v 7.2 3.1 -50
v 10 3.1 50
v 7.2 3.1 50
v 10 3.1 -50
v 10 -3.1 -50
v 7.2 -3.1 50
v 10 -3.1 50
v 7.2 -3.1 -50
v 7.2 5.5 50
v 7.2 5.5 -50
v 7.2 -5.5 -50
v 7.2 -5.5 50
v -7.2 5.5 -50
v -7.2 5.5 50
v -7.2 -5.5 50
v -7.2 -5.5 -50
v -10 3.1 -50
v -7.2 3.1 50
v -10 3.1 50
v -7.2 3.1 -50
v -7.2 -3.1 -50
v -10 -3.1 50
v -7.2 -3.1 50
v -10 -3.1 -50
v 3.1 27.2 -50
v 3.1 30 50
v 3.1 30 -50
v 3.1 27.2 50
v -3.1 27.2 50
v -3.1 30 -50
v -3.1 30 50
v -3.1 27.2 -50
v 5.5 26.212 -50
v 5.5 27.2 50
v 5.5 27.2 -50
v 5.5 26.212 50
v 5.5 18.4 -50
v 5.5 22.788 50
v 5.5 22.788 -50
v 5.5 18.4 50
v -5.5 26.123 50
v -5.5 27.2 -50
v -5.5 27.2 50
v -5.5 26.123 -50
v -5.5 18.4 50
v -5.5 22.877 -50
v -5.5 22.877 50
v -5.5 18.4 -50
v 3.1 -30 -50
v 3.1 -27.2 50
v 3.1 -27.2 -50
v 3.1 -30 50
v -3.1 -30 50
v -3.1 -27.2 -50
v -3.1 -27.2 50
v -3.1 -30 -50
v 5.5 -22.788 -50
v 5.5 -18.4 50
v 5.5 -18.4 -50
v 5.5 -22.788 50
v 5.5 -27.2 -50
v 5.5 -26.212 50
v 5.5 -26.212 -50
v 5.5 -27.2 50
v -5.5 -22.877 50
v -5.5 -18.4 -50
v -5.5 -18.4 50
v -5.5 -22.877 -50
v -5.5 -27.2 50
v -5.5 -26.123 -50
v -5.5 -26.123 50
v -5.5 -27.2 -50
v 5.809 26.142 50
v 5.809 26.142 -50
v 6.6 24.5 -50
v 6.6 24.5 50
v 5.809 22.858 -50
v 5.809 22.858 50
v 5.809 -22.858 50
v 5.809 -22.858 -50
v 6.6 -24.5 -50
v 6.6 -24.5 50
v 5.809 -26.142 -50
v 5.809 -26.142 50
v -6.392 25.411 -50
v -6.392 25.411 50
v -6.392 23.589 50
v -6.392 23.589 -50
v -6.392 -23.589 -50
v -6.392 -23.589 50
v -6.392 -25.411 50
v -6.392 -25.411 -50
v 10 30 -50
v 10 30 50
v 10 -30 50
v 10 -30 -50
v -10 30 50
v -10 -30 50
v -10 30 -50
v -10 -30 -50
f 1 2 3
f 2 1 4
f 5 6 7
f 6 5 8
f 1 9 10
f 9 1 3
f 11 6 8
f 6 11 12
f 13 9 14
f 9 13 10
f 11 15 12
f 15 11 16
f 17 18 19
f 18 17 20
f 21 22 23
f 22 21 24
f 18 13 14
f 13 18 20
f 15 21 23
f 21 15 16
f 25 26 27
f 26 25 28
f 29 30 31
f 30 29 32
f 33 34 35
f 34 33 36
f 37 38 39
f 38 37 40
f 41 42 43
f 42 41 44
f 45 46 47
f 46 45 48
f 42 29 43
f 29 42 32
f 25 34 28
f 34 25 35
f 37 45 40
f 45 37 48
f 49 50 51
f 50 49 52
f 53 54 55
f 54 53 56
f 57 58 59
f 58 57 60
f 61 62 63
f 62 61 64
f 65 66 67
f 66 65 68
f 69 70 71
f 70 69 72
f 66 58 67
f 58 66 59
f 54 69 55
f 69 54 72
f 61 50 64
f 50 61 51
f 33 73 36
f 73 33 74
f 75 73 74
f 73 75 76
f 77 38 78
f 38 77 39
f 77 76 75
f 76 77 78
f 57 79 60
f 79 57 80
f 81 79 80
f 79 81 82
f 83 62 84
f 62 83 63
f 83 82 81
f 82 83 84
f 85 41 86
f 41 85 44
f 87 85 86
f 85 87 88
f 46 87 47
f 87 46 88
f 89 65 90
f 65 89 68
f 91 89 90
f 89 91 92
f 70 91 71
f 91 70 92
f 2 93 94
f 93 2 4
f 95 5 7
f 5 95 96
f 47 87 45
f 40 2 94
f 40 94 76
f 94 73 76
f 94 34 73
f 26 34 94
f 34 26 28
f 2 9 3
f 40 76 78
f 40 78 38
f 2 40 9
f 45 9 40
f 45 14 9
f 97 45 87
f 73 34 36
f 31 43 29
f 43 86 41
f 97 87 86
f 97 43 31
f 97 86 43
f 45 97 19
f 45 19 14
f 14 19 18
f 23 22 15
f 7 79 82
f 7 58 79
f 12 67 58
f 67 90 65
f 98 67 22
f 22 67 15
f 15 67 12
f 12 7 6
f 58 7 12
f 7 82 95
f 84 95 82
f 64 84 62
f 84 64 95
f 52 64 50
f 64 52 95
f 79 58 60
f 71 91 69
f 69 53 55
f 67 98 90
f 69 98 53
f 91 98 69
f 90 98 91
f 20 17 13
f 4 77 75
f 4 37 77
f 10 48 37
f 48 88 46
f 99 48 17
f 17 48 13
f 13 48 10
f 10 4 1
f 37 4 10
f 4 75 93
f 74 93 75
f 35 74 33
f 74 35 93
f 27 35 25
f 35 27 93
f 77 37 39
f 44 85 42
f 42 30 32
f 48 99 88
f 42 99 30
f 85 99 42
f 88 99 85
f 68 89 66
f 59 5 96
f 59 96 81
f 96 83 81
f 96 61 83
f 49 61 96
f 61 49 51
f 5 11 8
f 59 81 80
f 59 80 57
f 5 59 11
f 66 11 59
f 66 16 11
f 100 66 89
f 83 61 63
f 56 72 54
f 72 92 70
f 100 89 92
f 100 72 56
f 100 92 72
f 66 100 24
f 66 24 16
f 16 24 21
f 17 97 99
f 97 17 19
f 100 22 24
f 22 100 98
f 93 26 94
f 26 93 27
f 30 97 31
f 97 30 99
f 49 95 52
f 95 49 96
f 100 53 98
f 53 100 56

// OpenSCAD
// Parameters
cross_section_width_mm = 20; //[10:40:1]
cross_section_height_mm = 60; //[30:120:1]
length_mm = 100; //[50:200:1]
center_length = 1; //[0:1:1]
include_corner_holes = 1; //[0:1:1]
eps_mm = 0.8; //[0.2:2:0.1]
wall_thickness_mm = 2.2; //[1.2:4.4:0.1]
t_slot_opening_mm = 6.2; //[4:10:0.1]
t_slot_neck_depth_mm = 3.2; //[2:6:0.1]
t_slot_cavity_width_mm = 11; //[8:16:0.1]
t_slot_cavity_depth_mm = 8; //[5:14:0.1]
center_bore_diameter_mm = 5.2; //[3:10:0.1]
web_thickness_mm = 2.0; //[1.0:4.0:0.1]
corner_hole_diameter_mm = 4.2; //[2.5:8:0.1]
corner_hole_inset_mm = 5.5; //[3:12:0.1]

// Extrusion - complete detailed geometry
module extrusion() {
  color("Silver") {
    difference() {
      // Main body
      translate([0, 0, center_length*(0) + (1-center_length)*(length_mm/2)])
        cube([cross_section_width_mm, cross_section_height_mm, length_mm], center=true);
      
      // T-slot channels
      union() {
        translate([cross_section_width_mm/2 - (t_slot_neck_depth_mm + eps_mm)/2 + eps_mm/2, 0, center_length*(0) + (1-center_length)*(length_mm/2)])
          cube([t_slot_neck_depth_mm + eps_mm, t_slot_opening_mm, length_mm + 2*eps_mm], center=true);
        translate([cross_section_width_mm/2 - t_slot_neck_depth_mm - (t_slot_cavity_depth_mm + eps_mm)/2 + eps_mm/2, 0, center_length*(0) + (1-center_length)*(length_mm/2)])
          cube([t_slot_cavity_depth_mm + eps_mm, t_slot_cavity_width_mm, length_mm + 2*eps_mm], center=true);
        translate([-cross_section_width_mm/2 + (t_slot_neck_depth_mm + eps_mm)/2 - eps_mm/2, 0, center_length*(0) + (1-center_length)*(length_mm/2)])
          cube([t_slot_neck_depth_mm + eps_mm, t_slot_opening_mm, length_mm + 2*eps_mm], center=true);
        translate([-cross_section_width_mm/2 + t_slot_neck_depth_mm + (t_slot_cavity_depth_mm + eps_mm)/2 - eps_mm/2, 0, center_length*(0) + (1-center_length)*(length_mm/2)])
          cube([t_slot_cavity_depth_mm + eps_mm, t_slot_cavity_width_mm, length_mm + 2*eps_mm], center=true);
        translate([0, cross_section_height_mm/2 - (t_slot_neck_depth_mm + eps_mm)/2 + eps_mm/2, center_length*(0) + (1-center_length)*(length_mm/2)])
          cube([t_slot_opening_mm, t_slot_neck_depth_mm + eps_mm, length_mm + 2*eps_mm], center=true);
        translate([0, cross_section_height_mm/2 - t_slot_neck_depth_mm - (t_slot_cavity_depth_mm + eps_mm)/2 + eps_mm/2, center_length*(0) + (1-center_length)*(length_mm/2)])
          cube([t_slot_cavity_width_mm, t_slot_cavity_depth_mm + eps_mm, length_mm + 2*eps_mm], center=true);
        translate([0, -cross_section_height_mm/2 + (t_slot_neck_depth_mm + eps_mm)/2 - eps_mm/2, center_length*(0) + (1-center_length)*(length_mm/2)])
          cube([t_slot_opening_mm, t_slot_neck_depth_mm + eps_mm, length_mm + 2*eps_mm], center=true);
        translate([0, -cross_section_height_mm/2 + t_slot_neck_depth_mm + (t_slot_cavity_depth_mm + eps_mm)/2 - eps_mm/2, center_length*(0) + (1-center_length)*(length_mm/2)])
          cube([t_slot_cavity_width_mm, t_slot_cavity_depth_mm + eps_mm, length_mm + 2*eps_mm], center=true);
      }
      
      // Center bore
      translate([0, 0, center_length*(0) + (1-center_length)*(length_mm/2)])
        cylinder(r=center_bore_diameter_mm/2, h=length_mm + 2*eps_mm, center=true);
      
      // Corner holes
      if (include_corner_holes) {
        union() {
          translate([cross_section_width_mm/2 - corner_hole_inset_mm, cross_section_height_mm/2 - corner_hole_inset_mm, center_length*(0) + (1-center_length)*(length_mm/2)])
            cylinder(r=corner_hole_diameter_mm/2, h=length_mm + 2*eps_mm, center=true);
          translate([cross_section_width_mm/2 - corner_hole_inset_mm, -cross_section_height_mm/2 + corner_hole_inset_mm, center_length*(0) + (1-center_length)*(length_mm/2)])
            cylinder(r=corner_hole_diameter_mm/2, h=length_mm + 2*eps_mm, center=true);
          translate([-cross_section_width_mm/2 + corner_hole_inset_mm, cross_section_height_mm/2 - corner_hole_inset_mm, center_length*(0) + (1-center_length)*(length_mm/2)])
            cylinder(r=corner_hole_diameter_mm/2, h=length_mm + 2*eps_mm, center=true);
          translate([-cross_section_width_mm/2 + corner_hole_inset_mm, -cross_section_height_mm/2 + corner_hole_inset_mm, center_length*(0) + (1-center_length)*(length_mm/2)])
            cylinder(r=corner_hole_diameter_mm/2, h=length_mm + 2*eps_mm, center=true);
        }
      }
    }
  }
}

// Extrusion Cross Section - detailed geometry
module extrusion_cross_section() {
  color("DimGray") {
    difference() {
      // Main body
      translate([0, 0, center_length*(0) + (1-center_length)*(length_mm/2)])
        cube([cross_section_width_mm, cross_section_height_mm, length_mm], center=true);
      
      // T-slot channels
      union() {
        translate([cross_section_width_mm/2 - (t_slot_neck_depth_mm + eps_mm)/2 + eps_mm/2, 0, center_length*(0) + (1-center_length)*(length_mm/2)])
          cube([t_slot_neck_depth_mm + eps_mm, t_slot_opening_mm, length_mm + 2*eps_mm], center=true);
        translate([cross_section_width_mm/2 - t_slot_neck_depth_mm - (t_slot_cavity_depth_mm + eps_mm)/2 + eps_mm/2, 0, center_length*(0) + (1-center_length)*(length_mm/2)])
          cube([t_slot_cavity_depth_mm + eps_mm, t_slot_cavity_width_mm, length_mm + 2*eps_mm], center=true);
        translate([-cross_section_width_mm/2 + (t_slot_neck_depth_mm + eps_mm)/2 - eps_mm/2, 0, center_length*(0) + (1-center_length)*(length_mm/2)])
          cube([t_slot_neck_depth_mm + eps_mm, t_slot_opening_mm, length_mm + 2*eps_mm], center=true);
        translate([-cross_section_width_mm/2 + t_slot_neck_depth_mm + (t_slot_cavity_depth_mm + eps_mm)/2 - eps_mm/2, 0, center_length*(0) + (1-center_length)*(length_mm/2)])
          cube([t_slot_cavity_depth_mm + eps_mm, t_slot_cavity_width_mm, length_mm + 2*eps_mm], center=true);
        translate([0, cross_section_height_mm/2 - (t_slot_neck_depth_mm + eps_mm)/2 + eps_mm/2, center_length*(0) + (1-center_length)*(length_mm/2)])
          cube([t_slot_opening_mm, t_slot_neck_depth_mm + eps_mm, length_mm + 2*eps_mm], center=true);
        translate([0, cross_section_height_mm/2 - t_slot_neck_depth_mm - (t_slot_cavity_depth_mm + eps_mm)/2 + eps_mm/2, center_length*(0) + (1-center_length)*(length_mm/2)])
          cube([t_slot_cavity_width_mm, t_slot_cavity_depth_mm + eps_mm, length_mm + 2*eps_mm], center=true);
        translate([0, -cross_section_height_mm/2 + (t_slot_neck_depth_mm + eps_mm)/2 - eps_mm/2, center_length*(0) + (1-center_length)*(length_mm/2)])
          cube([t_slot_opening_mm, t_slot_neck_depth_mm + eps_mm, length_mm + 2*eps_mm], center=true);
        translate([0, -cross_section_height_mm/2 + t_slot_neck_depth_mm + (t_slot_cavity_depth_mm + eps_mm)/2 - eps_mm/2, center_length*(0) + (1-center_length)*(length_mm/2)])
          cube([t_slot_cavity_width_mm, t_slot_cavity_depth_mm + eps_mm, length_mm + 2*eps_mm], center=true);
      }
      
      // Center bore
      translate([0, 0, center_length*(0) + (1-center_length)*(length_mm/2)])
        cylinder(r=center_bore_diameter_mm/2, h=length_mm + 2*eps_mm, center=true);
      
      // Corner holes
      if (include_corner_holes) {
        union() {
          translate([cross_section_width_mm/2 - corner_hole_inset_mm, cross_section_height_mm/2 - corner_hole_inset_mm, center_length*(0) + (1-center_length)*(length_mm/2)])
            cylinder(r=corner_hole_diameter_mm/2, h=length_mm + 2*eps_mm, center=true);
          translate([cross_section_width_mm/2 - corner_hole_inset_mm, -cross_section_height_mm/2 + corner_hole_inset_mm, center_length*(0) + (1-center_length)*(length_mm/2)])
            cylinder(r=corner_hole_diameter_mm/2, h=length_mm + 2*eps_mm, center=true);
          translate([-cross_section_width_mm/2 + corner_hole_inset_mm, cross_section_height_mm/2 - corner_hole_inset_mm, center_length*(0) + (1-center_length)*(length_mm/2)])
            cylinder(r=corner_hole_diameter_mm/2, h=length_mm + 2*eps_mm, center=true);
          translate([-cross_section_width_mm/2 + corner_hole_inset_mm, -cross_section_height_mm/2 + corner_hole_inset_mm, center_length*(0) + (1-center_length)*(length_mm/2)])
            cylinder(r=corner_hole_diameter_mm/2, h=length_mm + 2*eps_mm, center=true);
        }
      }
    }
  }
}

// Box Corner Profile Section - detailed geometry
module box_corner_profile_section() {
  color("Black") {
    translate([cross_section_width_mm/2 - wall_thickness_mm/2, cross_section_height_mm/2 - wall_thickness_mm/2, center_length*(0) + (1-center_length)*(length_mm/2)])
      cube([wall_thickness_mm, wall_thickness_mm, length_mm], center=true);
  }
}

// Box Corner Profile Sections - detailed geometry
module box_corner_profile_sections() {
  color("Black") {
    union() {
      translate([cross_section_width_mm/2 - wall_thickness_mm/2, cross_section_height_mm/2 - wall_thickness_mm/2, center_length*(0) + (1-center_length)*(length_mm/2)])
        cube([wall_thickness_mm, wall_thickness_mm, length_mm], center=true);
      translate([cross_section_width_mm/2 - wall_thickness_mm/2, -cross_section_height_mm/2 + wall_thickness_mm/2, center_length*(0) + (1-center_length)*(length_mm/2)])
        cube([wall_thickness_mm, wall_thickness_mm, length_mm], center=true);
      translate([-cross_section_width_mm/2 + wall_thickness_mm/2, cross_section_height_mm/2 - wall_thickness_mm/2, center_length*(0) + (1-center_length)*(length_mm/2)])
        cube([wall_thickness_mm, wall_thickness_mm, length_mm], center=true);
      translate([-cross_section_width_mm/2 + wall_thickness_mm/2, -cross_section_height_mm/2 + wall_thickness_mm/2, center_length*(0) + (1-center_length)*(length_mm/2)])
        cube([wall_thickness_mm, wall_thickness_mm, length_mm], center=true);
    }
  }
}

// Assembly
module assembly() {
  extrusion();
  extrusion_cross_section();
  box_corner_profile_section();
  box_corner_profile_sections();
}

assembly();
